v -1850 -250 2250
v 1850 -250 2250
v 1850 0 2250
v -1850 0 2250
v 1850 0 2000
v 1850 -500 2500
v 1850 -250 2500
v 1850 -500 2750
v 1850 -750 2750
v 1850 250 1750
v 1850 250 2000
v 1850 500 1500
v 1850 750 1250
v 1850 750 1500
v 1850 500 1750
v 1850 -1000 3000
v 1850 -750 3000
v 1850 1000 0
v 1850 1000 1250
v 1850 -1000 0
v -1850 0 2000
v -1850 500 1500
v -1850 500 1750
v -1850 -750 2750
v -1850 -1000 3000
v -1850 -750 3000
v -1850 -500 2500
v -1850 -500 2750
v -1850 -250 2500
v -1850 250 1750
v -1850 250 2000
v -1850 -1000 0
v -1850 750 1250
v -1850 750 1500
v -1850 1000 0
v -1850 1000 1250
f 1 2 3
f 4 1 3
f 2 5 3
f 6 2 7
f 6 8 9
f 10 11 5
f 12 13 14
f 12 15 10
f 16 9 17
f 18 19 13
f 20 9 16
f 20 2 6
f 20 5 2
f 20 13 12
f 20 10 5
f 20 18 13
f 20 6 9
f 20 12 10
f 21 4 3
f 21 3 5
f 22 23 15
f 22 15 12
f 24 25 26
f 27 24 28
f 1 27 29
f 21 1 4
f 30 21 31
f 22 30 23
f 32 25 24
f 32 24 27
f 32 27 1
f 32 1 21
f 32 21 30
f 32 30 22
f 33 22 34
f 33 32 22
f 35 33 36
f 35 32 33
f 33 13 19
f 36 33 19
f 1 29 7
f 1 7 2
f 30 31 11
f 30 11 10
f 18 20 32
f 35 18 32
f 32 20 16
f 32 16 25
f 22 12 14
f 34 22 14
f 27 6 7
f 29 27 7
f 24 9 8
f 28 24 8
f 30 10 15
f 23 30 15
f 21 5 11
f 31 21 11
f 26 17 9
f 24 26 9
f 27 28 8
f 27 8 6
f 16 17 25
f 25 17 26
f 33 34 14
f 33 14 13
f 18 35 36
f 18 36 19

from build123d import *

# Parameters (mm, degrees)
BOSS_EXTRUDE2_DEPTH = 3000
CUT_EXTRUDE1_DEPTH  = 4000


with BuildPart() as part:
    # 3DSketch3 → Boss-Extrude2 (new body)
    with BuildSketch(Plane(origin=(-1850, 1000, 0), x_dir=(0.8797065135761271, -0.47551703436547405, 0), z_dir=(0, 0, 1))):
        Polygon((0, 0), (3254.914100232, 1759.413027152), (4205.948168963, 0), (951.034068731, -1759.413027152), align=None)
    extrude(amount=BOSS_EXTRUDE2_DEPTH)

    # Sketch4 → Cut-Extrude1 (cut)
    with BuildSketch(Plane.ZY.offset(1850)):
        Polygon((3000, -750), (2750, -750), (2750, -500), (2500, -500), (2500, -250), (2250, -250), (2250, 0), (2000, 0), (2000, 250), (1750, 250), (1750, 500), (1500, 500), (1500, 750), (1250, 750), (1250, 1000), (3000, 1000), align=None)
    extrude(amount=-CUT_EXTRUDE1_DEPTH, mode=Mode.SUBTRACT)


solid = part.part
